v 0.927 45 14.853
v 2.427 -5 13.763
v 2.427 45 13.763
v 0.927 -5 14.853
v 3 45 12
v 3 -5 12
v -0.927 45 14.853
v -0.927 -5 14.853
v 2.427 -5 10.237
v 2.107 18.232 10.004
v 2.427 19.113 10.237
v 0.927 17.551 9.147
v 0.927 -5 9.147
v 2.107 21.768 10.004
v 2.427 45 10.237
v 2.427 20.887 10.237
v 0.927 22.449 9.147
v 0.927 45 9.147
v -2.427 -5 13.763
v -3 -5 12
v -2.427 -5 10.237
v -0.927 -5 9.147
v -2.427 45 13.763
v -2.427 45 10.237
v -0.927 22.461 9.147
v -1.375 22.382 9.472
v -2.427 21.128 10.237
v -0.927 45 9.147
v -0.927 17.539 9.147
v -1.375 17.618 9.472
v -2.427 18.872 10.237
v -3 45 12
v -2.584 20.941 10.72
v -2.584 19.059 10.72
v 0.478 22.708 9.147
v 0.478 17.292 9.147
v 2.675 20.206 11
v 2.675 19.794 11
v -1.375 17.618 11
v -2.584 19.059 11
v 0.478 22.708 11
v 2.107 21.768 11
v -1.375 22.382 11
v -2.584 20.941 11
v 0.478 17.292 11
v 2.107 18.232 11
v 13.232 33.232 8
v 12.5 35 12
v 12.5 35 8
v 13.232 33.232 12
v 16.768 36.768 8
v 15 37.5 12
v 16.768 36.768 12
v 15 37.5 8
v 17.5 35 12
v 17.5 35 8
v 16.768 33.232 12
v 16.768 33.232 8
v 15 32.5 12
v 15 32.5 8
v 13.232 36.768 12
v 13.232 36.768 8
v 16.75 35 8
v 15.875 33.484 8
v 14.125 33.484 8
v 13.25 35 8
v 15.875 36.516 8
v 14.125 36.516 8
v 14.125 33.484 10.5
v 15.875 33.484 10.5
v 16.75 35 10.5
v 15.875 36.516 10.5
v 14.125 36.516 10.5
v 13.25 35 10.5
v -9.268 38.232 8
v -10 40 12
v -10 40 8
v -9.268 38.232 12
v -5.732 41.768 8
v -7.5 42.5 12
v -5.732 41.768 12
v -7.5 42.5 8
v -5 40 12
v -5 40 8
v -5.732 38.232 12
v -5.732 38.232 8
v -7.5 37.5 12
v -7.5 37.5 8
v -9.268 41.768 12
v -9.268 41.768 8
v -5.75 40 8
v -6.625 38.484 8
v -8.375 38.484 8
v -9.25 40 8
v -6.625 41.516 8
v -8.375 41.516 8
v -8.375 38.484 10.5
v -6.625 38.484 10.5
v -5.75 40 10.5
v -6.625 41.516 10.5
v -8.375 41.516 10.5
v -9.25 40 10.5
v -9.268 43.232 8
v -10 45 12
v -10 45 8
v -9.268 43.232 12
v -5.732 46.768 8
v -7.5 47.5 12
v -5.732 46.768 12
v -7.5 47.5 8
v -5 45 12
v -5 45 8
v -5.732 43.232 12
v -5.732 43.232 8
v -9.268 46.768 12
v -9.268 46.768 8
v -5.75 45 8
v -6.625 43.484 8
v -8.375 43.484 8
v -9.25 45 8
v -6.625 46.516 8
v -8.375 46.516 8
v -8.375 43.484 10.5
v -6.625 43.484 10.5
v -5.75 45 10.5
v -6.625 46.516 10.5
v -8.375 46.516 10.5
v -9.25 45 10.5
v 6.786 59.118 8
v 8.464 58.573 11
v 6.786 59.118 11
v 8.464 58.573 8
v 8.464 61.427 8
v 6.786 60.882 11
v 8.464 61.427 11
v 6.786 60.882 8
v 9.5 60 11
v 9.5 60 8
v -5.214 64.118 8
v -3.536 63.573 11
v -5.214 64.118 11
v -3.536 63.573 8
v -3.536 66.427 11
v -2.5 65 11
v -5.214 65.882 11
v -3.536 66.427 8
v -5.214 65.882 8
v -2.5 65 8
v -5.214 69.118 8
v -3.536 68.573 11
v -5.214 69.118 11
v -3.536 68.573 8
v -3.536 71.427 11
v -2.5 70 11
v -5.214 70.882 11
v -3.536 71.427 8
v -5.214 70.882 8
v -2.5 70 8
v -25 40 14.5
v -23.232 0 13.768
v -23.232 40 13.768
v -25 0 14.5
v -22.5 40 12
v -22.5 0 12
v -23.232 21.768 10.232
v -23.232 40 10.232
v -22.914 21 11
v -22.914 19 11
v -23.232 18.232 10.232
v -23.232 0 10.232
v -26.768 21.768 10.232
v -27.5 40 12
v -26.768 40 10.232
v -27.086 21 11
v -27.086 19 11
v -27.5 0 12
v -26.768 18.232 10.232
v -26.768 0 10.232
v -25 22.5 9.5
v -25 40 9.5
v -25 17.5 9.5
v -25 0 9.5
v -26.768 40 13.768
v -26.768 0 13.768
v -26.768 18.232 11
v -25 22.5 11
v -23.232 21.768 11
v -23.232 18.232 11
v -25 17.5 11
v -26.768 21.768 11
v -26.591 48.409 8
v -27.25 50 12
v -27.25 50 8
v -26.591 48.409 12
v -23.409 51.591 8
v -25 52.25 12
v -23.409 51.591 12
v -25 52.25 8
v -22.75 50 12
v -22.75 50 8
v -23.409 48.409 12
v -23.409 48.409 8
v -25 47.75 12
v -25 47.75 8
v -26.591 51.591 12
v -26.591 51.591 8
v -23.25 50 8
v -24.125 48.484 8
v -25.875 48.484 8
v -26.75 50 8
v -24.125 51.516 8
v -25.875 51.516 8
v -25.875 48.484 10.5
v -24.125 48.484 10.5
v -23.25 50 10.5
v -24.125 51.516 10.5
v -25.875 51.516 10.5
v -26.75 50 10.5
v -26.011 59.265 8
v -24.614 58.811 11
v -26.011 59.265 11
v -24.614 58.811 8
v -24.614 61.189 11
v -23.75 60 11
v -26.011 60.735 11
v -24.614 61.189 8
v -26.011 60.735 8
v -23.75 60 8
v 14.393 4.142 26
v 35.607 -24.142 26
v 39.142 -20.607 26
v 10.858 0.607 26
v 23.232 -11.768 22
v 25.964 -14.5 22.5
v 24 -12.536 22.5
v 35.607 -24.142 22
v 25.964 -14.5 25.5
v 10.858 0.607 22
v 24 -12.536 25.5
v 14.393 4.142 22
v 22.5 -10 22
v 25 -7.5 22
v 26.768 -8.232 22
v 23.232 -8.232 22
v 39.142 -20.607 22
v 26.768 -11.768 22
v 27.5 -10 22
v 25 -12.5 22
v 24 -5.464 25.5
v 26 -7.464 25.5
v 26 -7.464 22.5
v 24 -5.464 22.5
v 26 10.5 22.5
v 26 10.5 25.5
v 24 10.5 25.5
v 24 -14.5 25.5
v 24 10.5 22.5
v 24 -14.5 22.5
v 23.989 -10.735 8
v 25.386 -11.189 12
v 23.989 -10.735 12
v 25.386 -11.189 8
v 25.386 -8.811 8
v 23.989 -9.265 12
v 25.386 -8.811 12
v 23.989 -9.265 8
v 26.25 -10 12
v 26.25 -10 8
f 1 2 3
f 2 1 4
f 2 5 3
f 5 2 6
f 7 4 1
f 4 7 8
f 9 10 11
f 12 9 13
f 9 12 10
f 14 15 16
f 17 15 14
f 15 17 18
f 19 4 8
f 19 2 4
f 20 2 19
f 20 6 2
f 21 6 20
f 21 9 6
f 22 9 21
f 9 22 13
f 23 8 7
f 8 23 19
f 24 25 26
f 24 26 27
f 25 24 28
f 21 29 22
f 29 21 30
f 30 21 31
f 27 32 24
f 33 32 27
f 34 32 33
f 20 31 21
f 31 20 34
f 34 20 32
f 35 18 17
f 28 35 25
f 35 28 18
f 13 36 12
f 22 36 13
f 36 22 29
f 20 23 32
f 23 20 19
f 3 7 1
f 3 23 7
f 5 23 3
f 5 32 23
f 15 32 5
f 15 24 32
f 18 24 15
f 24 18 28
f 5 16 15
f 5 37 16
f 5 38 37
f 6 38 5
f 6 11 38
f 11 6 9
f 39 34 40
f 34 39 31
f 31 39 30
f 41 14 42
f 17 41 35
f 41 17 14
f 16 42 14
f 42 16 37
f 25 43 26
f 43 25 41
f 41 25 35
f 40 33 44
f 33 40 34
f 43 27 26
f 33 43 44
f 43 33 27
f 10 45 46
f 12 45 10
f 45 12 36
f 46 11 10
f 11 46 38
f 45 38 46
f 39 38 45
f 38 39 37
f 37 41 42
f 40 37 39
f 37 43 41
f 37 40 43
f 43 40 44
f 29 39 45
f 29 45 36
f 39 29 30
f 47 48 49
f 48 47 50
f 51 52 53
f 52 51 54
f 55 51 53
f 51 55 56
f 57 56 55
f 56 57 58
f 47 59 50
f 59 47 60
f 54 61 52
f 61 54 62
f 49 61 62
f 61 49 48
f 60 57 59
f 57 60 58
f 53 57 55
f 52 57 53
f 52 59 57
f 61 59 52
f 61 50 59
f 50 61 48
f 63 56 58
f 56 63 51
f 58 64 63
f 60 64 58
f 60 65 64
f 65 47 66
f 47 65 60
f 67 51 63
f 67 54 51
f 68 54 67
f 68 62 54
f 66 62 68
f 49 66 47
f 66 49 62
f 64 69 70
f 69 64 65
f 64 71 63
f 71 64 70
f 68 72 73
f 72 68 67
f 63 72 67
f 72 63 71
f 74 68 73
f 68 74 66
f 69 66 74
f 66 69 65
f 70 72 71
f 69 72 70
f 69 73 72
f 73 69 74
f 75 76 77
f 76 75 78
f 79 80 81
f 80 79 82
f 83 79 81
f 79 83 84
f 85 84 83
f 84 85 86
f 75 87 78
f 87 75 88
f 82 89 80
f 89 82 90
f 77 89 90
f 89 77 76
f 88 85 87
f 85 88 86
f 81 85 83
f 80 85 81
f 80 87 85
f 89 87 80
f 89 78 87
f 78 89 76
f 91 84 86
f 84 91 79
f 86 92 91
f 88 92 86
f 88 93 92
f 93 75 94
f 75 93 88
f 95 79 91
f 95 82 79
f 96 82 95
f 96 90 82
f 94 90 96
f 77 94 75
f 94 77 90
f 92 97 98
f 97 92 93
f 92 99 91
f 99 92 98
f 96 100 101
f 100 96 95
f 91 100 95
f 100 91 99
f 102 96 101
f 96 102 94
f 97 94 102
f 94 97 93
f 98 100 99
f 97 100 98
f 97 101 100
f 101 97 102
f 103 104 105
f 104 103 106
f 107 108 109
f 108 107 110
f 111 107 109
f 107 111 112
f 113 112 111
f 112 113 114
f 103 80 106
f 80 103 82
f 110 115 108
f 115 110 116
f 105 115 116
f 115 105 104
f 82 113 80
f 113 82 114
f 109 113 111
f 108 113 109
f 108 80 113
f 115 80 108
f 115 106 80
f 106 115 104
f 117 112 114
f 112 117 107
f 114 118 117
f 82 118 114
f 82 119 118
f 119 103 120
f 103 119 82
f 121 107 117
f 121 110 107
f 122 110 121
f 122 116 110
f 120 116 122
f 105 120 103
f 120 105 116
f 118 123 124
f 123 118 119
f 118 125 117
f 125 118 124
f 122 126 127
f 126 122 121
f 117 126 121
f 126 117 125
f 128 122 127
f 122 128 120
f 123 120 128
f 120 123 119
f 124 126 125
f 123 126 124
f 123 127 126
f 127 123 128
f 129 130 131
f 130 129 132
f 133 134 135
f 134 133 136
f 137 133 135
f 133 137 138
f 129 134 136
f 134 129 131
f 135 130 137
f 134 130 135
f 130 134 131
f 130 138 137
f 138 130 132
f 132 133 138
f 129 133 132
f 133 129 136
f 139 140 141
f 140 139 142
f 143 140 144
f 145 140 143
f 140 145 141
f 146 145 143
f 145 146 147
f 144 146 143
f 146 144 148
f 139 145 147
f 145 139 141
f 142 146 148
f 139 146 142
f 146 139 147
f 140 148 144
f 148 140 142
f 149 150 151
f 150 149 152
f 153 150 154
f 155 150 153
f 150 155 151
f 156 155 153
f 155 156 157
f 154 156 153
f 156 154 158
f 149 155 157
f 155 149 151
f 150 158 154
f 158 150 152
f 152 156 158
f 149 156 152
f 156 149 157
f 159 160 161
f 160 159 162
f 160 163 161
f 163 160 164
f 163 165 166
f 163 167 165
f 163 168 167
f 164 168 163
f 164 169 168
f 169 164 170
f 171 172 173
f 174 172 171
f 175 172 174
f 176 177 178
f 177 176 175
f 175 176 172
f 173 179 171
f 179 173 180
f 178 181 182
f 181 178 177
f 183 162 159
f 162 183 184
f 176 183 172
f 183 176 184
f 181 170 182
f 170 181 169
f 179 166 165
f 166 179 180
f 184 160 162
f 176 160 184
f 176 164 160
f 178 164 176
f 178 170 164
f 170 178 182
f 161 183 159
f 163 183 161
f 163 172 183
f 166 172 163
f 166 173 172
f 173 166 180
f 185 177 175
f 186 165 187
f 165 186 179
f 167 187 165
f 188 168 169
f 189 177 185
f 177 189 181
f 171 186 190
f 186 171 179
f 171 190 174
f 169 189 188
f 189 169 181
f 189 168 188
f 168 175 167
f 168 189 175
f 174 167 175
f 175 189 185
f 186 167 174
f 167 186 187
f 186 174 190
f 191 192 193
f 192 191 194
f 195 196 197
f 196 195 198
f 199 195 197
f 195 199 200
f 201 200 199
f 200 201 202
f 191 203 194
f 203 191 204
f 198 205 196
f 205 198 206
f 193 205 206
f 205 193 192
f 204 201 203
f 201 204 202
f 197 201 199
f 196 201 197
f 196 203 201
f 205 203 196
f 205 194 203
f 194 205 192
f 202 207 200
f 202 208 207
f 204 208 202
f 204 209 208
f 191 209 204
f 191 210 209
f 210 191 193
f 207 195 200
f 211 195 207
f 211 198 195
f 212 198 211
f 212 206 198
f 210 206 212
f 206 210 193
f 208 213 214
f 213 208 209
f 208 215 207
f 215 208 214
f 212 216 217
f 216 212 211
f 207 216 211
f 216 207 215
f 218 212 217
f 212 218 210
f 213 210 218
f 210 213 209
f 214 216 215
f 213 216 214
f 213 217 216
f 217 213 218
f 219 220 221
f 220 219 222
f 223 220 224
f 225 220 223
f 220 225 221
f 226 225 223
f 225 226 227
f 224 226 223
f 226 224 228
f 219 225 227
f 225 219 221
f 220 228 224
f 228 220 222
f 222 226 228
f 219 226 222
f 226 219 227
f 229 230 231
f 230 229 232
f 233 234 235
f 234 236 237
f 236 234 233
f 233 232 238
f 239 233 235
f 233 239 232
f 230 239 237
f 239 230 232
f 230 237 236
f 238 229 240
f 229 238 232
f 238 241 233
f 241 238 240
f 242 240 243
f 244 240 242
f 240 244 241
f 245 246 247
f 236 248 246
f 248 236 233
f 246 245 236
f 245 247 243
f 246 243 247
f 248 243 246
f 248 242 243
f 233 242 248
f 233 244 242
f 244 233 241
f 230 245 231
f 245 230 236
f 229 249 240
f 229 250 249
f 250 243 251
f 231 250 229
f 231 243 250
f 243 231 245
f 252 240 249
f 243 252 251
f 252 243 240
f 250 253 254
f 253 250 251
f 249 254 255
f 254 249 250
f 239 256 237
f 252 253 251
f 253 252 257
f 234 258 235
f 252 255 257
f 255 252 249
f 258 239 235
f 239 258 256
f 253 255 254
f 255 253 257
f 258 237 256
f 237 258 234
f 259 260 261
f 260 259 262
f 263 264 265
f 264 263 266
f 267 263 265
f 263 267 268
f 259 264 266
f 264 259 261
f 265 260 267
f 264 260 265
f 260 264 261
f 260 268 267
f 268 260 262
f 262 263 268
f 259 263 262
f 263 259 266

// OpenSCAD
// Goblin Hand Linkage & Control Mechanism
// Demonstrates servo-to-finger control via push-pull cables and rigid linkages
// Shows how 3 servos control coupled finger groups (8-12 servos equivalent complexity)

// ==============================================================================
// CABLE ROUTING AND LINKAGE SYSTEM
// ==============================================================================

// Cable routing nodes (mm)
CABLE_ROUTING_HEIGHT = 8.0;   // Height of cable guides above palm
CABLE_DIAMETER = 2.0;         // Diameter of control cables (Spectra or dyneema)
CABLE_GUIDE_D = 3.5;          // Internal diameter of cable routing eyelets

// ==============================================================================
// SERVO #1: MAIN FINGER CURL (Index, Middle, Ring fingers)
// ==============================================================================

module servo1_curl_linkage() {
    // Servo position: center of palm, 20mm forward
    servo_pos = [0, 20, 12];
    
    // Mechanical system:
    // - Servo horn attached to horizontal push-pull rod
    // - Rod drives cable bundle to index/middle/ring fingers
    // - Tension cable pulls fingers curled (closed grip)
    // - Spring returns to open position
    
    // Push-pull rod (connects servo to cable)
    translate(servo_pos)
        difference() {
            // Rod main body (aluminum, lightweight)
            rotate([90, 0, 0])
                cylinder(h=50, d=6, center=true);
            
            // Servo horn attachment point
            translate([0, 0, -3])
                cylinder(h=4, d=5.5, center=true);
            
            // Cable anchor points (3 separate tension lines to three finger groups)
            for(angle = [0, 120, 240]) {
                translate([cos(angle)*8, sin(angle)*8, 20])
                    cylinder(h=6, d=2.5, center=true);
            }
        }
    
    // Cable guides (keep cables separated and aligned)
    for(i = [0:2]) {
        angle = i * 120;
        guide_x = cos(angle) * 15;
        guide_y = 35 + i*5;
        
        translate([guide_x, guide_y, CABLE_ROUTING_HEIGHT])
            difference() {
                cylinder(h=4, d=5);
                cylinder(h=5, d=CABLE_GUIDE_D, center=true);
            }
    }
    
    // Tension springs (return fingers to open position)
    for(i = [0:2]) {
        angle = i * 120;
        from_x = cos(angle)*8;
        to_x = cos(angle)*15;
        
        translate([from_x, 60 + i*5, CABLE_ROUTING_HEIGHT])
            cylinder(h=3, d=3);
    }
}

// ==============================================================================
// SERVO #2: PINKY GROUP CONTROL
// ==============================================================================

module servo2_pinky_linkage() {
    // Servo position: left side of palm, near pinky location
    servo_pos = [-25, 20, 12];
    
    // Similar push-pull mechanism but smaller
    // Controls only the pinky finger (can curl independently)
    
    translate(servo_pos)
        difference() {
            // Servo linkage rod (smaller diameter)
            rotate([90, 0, 0])
                cylinder(h=40, d=5, center=true);
            
            // Servo horn attachment
            translate([0, 0, -2.5])
                cylinder(h=3, d=5, center=true);
            
            // Pinky cable anchor
            translate([0, 0, 15])
                cylinder(h=5, d=2.2, center=true);
        }
    
    // Cable guide to pinky
    translate([-25, 50, CABLE_ROUTING_HEIGHT])
        difference() {
            cylinder(h=4, d=4.5);
            cylinder(h=5, d=CABLE_GUIDE_D, center=true);
        }
    
    // Return spring
    translate([-25, 60, CABLE_ROUTING_HEIGHT])
        cylinder(h=3, d=2.5);
}

// ==============================================================================
// SERVO #3: THUMB OPPOSITION CONTROL
// ==============================================================================

module servo3_thumb_linkage() {
    // Servo position: right side, thumb base
    servo_pos = [25, -10, 12];
    
    // Thumb uses rotating servo horn directly
    // Horn pushes thumb toward opposition angle (45° inward)
    
    translate(servo_pos) {
        difference() {
            // Servo linkage arm (curved, follows thumb arc)
            translate([0, 0, 12])
                rotate([0, 0, 45])
                    cube([5, 35, 4], center=true);
            
            // Servo attachment point
            translate([0, 0, 8])
                cylinder(h=4, d=5, center=true);
            
            // Thumb push point
            translate([12, 12, 12])
                cylinder(h=5, d=3.5, center=true);
        }
        
        // Reinforcing ribs on linkage arm
        translate([0, 8, 12])
            cube([2, 25, 3], center=true);
    }
    
    // Return spring (keeps thumb extended)
    translate([25, -10, CABLE_ROUTING_HEIGHT])
        cylinder(h=4, d=2.5);
}

// ==============================================================================
// CABLE ROUTING SCHEMATIC
// ==============================================================================

module cable_routing_schematic() {
    // Visualization of control cable paths (non-printed, just shows layout)
    
    // Main tension cable from servo #1 to fingers
    translate([0, 20, CABLE_ROUTING_HEIGHT]) {
        // Cable bundle splits into 3 paths
        color([0.8, 0.2, 0.2], 0.5) {
            // Path to index/middle/ring
            cylinder(h=50, d=CABLE_DIAMETER);
        }
    }
    
    // Pinky control cable
    color([0.2, 0.8, 0.2], 0.5) {
        translate([-25, 20, CABLE_ROUTING_HEIGHT])
            cylinder(h=40, d=CABLE_DIAMETER);
    }
    
    // Thumb opposition cable
    color([0.2, 0.2, 0.8], 0.5) {
        translate([25, -10, CABLE_ROUTING_HEIGHT])
            cylinder(h=30, d=CABLE_DIAMETER);
    }
}

// ==============================================================================
// COMPLETE CONTROL LINKAGE ASSEMBLY
// ==============================================================================

module complete_hand_linkages() {
    echo("=== Goblin Hand Control Linkage System ===");
    echo("Servo #1: Main finger curl (index+middle+ring coupled)");
    echo("Servo #2: Pinky group control");
    echo("Servo #3: Thumb opposition");
    echo("");
    echo("Total Servos: 3 (not 30+)");
    echo("Control Type: Push-pull cables + springs");
    echo("Total Hand Weight: ~180-220 grams");
    echo("Power Draw: ~2-3W per servo × 3 = 6-9W typical, 15W peak");
    
    servo1_curl_linkage();
    servo2_pinky_linkage();
    servo3_thumb_linkage();
}

// ==============================================================================
// POWER & THERMAL ANALYSIS
// ==============================================================================

function calculate_hand_power_draw() =
    let(
        // Servo specs (SG90 hobby servo)
        servo_idle = 0.02,        // 20mA @ 5V = 0.1W per servo
        servo_light = 0.3,        // 60mA @ 5V = 0.3W per servo
        servo_moderate = 0.75,    // 150mA @ 5V = 0.75W per servo
        servo_heavy = 2.0,        // 400mA @ 5V = 2W per servo
        
        // Hand states
        idle_power = servo_idle * 3,
        light_motion = servo_light * 3,
        moderate_grip = (servo_moderate * 2) + (servo_heavy * 1),  // 2 servos lifting, 1 gripping
        max_grip = servo_heavy * 3
    )
    [
        ["Idle", idle_power],
        ["Light motion", light_motion],
        ["Moderate grip", moderate_grip],
        ["Maximum grip", max_grip]
    ];

// ==============================================================================
// RENDERING
// ==============================================================================

// Render all linkage components
complete_hand_linkages();

// Display power characteristics
echo("");
echo("=== POWER CONSUMPTION PROFILE ===");
power_table = calculate_hand_power_draw();
for(i=[0:len(power_table)-1]) {
    echo(str(power_table[i][0], ": ", power_table[i][1], "W"));
}
